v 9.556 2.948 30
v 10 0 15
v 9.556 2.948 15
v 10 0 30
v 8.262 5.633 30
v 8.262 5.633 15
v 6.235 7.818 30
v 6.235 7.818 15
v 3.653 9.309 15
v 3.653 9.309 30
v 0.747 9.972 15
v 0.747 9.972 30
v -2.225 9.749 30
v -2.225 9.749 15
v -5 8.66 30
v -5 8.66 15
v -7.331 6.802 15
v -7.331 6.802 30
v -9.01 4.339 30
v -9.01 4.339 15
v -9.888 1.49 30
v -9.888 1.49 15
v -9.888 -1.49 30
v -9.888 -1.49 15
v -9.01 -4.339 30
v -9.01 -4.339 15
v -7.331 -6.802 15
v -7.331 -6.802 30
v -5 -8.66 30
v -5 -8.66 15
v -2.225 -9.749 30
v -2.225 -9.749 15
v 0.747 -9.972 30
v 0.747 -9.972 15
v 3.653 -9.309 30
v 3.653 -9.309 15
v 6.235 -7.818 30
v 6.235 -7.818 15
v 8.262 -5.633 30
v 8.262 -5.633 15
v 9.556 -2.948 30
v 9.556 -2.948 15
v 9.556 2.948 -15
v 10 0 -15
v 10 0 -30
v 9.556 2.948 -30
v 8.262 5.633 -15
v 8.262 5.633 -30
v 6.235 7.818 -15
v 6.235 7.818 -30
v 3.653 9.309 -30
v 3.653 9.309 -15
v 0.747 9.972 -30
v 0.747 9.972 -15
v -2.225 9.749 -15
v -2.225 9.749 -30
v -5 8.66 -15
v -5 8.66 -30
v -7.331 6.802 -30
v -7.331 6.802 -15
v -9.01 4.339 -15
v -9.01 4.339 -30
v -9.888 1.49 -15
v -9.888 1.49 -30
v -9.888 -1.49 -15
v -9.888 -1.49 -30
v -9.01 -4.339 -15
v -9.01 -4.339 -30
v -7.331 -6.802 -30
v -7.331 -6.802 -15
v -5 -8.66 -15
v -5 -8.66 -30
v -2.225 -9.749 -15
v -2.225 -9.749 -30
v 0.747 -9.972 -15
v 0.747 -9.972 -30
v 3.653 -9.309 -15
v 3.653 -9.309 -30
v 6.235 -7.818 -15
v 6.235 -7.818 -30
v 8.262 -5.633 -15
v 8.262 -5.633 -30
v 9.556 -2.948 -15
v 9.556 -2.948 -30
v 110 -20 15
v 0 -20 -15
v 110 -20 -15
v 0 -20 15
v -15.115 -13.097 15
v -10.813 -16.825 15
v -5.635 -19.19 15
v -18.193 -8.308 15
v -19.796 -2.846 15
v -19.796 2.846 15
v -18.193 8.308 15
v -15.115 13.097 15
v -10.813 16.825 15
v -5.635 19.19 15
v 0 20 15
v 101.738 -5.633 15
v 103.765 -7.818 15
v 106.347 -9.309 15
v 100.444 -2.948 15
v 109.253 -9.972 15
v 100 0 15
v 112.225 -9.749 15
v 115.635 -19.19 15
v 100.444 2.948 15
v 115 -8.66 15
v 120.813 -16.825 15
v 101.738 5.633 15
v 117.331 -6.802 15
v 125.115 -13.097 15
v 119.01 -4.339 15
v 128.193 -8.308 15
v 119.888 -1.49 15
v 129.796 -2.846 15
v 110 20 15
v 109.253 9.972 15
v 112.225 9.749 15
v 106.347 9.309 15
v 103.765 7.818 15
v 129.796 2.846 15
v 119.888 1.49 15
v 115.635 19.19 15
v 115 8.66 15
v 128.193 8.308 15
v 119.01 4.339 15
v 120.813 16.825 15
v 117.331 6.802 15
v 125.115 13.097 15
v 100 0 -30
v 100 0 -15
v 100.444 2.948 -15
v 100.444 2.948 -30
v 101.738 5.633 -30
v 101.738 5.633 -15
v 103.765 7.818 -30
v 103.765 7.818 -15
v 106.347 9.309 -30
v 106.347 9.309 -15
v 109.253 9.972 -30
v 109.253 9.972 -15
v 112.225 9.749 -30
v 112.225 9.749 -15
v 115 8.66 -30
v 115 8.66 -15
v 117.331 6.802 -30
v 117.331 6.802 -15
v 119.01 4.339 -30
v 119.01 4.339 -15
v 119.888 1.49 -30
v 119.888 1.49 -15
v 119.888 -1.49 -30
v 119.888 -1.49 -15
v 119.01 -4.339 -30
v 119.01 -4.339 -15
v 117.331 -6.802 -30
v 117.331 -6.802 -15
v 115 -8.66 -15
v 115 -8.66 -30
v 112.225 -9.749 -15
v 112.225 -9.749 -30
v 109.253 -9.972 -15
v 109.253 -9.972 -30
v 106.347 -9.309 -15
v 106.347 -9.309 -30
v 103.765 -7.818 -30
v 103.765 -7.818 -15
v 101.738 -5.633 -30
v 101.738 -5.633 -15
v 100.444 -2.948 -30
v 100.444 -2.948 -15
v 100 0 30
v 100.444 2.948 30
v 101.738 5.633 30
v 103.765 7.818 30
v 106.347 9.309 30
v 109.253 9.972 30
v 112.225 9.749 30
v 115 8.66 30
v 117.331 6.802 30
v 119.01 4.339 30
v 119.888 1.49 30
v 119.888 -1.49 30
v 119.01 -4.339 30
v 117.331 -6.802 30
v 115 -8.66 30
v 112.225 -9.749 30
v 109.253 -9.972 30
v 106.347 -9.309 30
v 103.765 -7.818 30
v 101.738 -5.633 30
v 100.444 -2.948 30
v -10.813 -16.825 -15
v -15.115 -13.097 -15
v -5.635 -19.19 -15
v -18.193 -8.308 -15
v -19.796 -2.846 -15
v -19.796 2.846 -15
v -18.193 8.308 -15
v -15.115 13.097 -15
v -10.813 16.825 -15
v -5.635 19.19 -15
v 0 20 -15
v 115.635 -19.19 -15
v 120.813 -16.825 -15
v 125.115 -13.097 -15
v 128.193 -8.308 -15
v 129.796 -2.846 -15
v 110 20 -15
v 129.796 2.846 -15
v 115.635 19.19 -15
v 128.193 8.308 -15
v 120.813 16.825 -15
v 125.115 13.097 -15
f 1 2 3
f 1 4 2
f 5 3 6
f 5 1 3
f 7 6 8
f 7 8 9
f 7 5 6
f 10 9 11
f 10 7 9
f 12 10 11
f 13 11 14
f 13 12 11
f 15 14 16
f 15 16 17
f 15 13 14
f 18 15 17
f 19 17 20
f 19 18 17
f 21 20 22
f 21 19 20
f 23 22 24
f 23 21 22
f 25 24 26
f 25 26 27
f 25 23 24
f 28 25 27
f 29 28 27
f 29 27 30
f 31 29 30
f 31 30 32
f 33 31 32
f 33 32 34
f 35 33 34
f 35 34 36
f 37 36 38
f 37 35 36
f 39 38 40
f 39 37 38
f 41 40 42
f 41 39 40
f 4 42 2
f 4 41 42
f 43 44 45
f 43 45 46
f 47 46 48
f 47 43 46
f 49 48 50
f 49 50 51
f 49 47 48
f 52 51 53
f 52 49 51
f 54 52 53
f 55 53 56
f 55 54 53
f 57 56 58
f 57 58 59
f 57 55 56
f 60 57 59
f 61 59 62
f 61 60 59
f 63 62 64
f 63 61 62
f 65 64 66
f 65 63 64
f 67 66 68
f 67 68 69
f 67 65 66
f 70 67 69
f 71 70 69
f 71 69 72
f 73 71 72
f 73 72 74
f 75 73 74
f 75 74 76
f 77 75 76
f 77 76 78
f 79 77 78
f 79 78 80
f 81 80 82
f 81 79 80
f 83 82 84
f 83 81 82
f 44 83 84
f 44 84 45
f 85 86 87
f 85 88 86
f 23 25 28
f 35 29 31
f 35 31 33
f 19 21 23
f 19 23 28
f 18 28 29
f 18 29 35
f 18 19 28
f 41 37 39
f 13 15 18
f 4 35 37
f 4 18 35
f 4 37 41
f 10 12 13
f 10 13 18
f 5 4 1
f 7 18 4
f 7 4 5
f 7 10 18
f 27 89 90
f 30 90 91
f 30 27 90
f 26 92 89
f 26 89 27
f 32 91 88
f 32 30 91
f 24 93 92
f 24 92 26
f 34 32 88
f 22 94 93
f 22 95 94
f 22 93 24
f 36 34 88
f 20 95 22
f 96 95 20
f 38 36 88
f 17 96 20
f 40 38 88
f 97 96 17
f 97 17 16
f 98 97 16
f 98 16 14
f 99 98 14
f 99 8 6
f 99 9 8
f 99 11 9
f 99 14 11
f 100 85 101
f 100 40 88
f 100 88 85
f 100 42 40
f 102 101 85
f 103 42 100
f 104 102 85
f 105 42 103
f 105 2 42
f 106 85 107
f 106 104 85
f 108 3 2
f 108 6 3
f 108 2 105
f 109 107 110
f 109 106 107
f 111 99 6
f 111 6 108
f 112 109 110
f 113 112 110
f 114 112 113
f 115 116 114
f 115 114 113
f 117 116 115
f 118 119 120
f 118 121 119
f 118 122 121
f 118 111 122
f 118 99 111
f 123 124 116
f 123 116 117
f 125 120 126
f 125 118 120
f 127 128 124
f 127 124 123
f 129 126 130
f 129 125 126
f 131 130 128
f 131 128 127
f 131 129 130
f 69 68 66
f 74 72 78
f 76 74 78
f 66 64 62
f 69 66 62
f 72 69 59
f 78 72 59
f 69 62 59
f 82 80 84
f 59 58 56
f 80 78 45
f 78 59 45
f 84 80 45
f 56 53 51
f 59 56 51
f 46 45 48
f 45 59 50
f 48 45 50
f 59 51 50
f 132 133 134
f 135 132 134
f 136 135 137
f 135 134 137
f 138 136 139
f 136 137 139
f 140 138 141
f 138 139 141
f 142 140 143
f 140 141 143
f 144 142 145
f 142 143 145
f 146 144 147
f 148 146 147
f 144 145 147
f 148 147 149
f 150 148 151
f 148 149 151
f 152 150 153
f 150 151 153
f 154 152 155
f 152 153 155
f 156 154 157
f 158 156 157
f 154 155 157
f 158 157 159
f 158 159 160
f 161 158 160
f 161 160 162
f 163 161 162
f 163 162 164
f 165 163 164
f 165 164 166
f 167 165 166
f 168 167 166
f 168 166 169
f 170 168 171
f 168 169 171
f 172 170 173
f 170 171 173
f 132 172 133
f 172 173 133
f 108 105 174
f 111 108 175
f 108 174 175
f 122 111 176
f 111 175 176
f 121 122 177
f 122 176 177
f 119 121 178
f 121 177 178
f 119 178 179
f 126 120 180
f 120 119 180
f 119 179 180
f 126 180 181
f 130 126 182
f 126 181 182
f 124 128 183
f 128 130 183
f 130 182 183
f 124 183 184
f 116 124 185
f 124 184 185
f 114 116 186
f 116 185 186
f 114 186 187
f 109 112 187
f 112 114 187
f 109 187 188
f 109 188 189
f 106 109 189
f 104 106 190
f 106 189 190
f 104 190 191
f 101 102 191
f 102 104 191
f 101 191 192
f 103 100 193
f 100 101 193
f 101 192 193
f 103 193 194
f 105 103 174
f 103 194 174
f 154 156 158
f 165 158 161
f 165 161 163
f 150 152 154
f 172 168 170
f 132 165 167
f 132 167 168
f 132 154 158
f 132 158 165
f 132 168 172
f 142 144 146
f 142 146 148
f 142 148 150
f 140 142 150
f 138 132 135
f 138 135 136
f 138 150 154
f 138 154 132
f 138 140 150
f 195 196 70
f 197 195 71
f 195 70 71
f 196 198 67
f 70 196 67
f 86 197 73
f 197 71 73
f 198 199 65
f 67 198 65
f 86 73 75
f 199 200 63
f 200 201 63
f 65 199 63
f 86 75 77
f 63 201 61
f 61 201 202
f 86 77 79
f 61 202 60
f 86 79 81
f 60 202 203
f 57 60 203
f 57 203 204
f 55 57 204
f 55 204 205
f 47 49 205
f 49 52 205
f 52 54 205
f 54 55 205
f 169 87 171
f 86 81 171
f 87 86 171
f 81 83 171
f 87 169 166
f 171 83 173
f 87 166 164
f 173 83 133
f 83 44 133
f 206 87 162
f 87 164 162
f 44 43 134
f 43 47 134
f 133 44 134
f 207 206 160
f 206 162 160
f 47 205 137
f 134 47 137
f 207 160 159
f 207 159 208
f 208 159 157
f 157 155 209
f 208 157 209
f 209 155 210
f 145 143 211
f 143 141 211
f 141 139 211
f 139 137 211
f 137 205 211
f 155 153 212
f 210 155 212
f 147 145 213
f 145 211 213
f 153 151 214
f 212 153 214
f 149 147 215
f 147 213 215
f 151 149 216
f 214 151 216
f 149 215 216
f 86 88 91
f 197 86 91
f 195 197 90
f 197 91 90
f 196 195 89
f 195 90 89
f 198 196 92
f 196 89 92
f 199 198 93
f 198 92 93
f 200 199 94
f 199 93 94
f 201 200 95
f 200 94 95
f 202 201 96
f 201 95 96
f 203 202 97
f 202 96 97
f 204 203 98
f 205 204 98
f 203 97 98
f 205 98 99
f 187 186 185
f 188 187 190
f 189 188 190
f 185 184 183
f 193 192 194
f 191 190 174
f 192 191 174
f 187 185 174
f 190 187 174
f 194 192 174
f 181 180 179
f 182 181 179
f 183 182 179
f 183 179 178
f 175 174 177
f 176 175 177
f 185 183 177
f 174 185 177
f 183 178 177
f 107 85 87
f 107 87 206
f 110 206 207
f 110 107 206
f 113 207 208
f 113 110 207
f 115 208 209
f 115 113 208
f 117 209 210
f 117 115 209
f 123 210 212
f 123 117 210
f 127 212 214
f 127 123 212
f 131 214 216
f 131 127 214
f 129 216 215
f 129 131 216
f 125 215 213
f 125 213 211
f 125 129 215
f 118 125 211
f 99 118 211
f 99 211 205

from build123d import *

# Parameters (mm, degrees)
SKETCH1_R           = 10
BOSS_EXTRUDE1_DEPTH = 30
BOSS_EXTRUDE2_DEPTH = 15


with BuildPart() as part:
    # Sketch1 → Boss-Extrude1 (new body, symmetric)
    with BuildSketch(Plane.XY):
        Circle(SKETCH1_R)
    boss_extrude1 = extrude(amount=BOSS_EXTRUDE1_DEPTH, both=True)

    # Sketch2 → Boss-Extrude2 (add, symmetric)
    with BuildSketch(Plane.XY):
        with BuildLine():
            Line((0, 20), (55, 20))
            Line((55, 20), (55, -20))
            Line((55, -20), (0, -20))
            ThreePointArc((0, -20), (-20, 0), (0, 20))
        make_face()
    boss_extrude2 = extrude(amount=BOSS_EXTRUDE2_DEPTH, both=True)

    # Mirror1: Boss-Extrude1, Boss-Extrude2 across plane
    add(boss_extrude1.mirror(Plane(origin=(55, 20, 15), x_dir=(0, 0, 1), z_dir=(-1, 0, 0))))
    add(boss_extrude2.mirror(Plane(origin=(55, 20, 15), x_dir=(0, 0, 1), z_dir=(-1, 0, 0))))


solid = part.part
